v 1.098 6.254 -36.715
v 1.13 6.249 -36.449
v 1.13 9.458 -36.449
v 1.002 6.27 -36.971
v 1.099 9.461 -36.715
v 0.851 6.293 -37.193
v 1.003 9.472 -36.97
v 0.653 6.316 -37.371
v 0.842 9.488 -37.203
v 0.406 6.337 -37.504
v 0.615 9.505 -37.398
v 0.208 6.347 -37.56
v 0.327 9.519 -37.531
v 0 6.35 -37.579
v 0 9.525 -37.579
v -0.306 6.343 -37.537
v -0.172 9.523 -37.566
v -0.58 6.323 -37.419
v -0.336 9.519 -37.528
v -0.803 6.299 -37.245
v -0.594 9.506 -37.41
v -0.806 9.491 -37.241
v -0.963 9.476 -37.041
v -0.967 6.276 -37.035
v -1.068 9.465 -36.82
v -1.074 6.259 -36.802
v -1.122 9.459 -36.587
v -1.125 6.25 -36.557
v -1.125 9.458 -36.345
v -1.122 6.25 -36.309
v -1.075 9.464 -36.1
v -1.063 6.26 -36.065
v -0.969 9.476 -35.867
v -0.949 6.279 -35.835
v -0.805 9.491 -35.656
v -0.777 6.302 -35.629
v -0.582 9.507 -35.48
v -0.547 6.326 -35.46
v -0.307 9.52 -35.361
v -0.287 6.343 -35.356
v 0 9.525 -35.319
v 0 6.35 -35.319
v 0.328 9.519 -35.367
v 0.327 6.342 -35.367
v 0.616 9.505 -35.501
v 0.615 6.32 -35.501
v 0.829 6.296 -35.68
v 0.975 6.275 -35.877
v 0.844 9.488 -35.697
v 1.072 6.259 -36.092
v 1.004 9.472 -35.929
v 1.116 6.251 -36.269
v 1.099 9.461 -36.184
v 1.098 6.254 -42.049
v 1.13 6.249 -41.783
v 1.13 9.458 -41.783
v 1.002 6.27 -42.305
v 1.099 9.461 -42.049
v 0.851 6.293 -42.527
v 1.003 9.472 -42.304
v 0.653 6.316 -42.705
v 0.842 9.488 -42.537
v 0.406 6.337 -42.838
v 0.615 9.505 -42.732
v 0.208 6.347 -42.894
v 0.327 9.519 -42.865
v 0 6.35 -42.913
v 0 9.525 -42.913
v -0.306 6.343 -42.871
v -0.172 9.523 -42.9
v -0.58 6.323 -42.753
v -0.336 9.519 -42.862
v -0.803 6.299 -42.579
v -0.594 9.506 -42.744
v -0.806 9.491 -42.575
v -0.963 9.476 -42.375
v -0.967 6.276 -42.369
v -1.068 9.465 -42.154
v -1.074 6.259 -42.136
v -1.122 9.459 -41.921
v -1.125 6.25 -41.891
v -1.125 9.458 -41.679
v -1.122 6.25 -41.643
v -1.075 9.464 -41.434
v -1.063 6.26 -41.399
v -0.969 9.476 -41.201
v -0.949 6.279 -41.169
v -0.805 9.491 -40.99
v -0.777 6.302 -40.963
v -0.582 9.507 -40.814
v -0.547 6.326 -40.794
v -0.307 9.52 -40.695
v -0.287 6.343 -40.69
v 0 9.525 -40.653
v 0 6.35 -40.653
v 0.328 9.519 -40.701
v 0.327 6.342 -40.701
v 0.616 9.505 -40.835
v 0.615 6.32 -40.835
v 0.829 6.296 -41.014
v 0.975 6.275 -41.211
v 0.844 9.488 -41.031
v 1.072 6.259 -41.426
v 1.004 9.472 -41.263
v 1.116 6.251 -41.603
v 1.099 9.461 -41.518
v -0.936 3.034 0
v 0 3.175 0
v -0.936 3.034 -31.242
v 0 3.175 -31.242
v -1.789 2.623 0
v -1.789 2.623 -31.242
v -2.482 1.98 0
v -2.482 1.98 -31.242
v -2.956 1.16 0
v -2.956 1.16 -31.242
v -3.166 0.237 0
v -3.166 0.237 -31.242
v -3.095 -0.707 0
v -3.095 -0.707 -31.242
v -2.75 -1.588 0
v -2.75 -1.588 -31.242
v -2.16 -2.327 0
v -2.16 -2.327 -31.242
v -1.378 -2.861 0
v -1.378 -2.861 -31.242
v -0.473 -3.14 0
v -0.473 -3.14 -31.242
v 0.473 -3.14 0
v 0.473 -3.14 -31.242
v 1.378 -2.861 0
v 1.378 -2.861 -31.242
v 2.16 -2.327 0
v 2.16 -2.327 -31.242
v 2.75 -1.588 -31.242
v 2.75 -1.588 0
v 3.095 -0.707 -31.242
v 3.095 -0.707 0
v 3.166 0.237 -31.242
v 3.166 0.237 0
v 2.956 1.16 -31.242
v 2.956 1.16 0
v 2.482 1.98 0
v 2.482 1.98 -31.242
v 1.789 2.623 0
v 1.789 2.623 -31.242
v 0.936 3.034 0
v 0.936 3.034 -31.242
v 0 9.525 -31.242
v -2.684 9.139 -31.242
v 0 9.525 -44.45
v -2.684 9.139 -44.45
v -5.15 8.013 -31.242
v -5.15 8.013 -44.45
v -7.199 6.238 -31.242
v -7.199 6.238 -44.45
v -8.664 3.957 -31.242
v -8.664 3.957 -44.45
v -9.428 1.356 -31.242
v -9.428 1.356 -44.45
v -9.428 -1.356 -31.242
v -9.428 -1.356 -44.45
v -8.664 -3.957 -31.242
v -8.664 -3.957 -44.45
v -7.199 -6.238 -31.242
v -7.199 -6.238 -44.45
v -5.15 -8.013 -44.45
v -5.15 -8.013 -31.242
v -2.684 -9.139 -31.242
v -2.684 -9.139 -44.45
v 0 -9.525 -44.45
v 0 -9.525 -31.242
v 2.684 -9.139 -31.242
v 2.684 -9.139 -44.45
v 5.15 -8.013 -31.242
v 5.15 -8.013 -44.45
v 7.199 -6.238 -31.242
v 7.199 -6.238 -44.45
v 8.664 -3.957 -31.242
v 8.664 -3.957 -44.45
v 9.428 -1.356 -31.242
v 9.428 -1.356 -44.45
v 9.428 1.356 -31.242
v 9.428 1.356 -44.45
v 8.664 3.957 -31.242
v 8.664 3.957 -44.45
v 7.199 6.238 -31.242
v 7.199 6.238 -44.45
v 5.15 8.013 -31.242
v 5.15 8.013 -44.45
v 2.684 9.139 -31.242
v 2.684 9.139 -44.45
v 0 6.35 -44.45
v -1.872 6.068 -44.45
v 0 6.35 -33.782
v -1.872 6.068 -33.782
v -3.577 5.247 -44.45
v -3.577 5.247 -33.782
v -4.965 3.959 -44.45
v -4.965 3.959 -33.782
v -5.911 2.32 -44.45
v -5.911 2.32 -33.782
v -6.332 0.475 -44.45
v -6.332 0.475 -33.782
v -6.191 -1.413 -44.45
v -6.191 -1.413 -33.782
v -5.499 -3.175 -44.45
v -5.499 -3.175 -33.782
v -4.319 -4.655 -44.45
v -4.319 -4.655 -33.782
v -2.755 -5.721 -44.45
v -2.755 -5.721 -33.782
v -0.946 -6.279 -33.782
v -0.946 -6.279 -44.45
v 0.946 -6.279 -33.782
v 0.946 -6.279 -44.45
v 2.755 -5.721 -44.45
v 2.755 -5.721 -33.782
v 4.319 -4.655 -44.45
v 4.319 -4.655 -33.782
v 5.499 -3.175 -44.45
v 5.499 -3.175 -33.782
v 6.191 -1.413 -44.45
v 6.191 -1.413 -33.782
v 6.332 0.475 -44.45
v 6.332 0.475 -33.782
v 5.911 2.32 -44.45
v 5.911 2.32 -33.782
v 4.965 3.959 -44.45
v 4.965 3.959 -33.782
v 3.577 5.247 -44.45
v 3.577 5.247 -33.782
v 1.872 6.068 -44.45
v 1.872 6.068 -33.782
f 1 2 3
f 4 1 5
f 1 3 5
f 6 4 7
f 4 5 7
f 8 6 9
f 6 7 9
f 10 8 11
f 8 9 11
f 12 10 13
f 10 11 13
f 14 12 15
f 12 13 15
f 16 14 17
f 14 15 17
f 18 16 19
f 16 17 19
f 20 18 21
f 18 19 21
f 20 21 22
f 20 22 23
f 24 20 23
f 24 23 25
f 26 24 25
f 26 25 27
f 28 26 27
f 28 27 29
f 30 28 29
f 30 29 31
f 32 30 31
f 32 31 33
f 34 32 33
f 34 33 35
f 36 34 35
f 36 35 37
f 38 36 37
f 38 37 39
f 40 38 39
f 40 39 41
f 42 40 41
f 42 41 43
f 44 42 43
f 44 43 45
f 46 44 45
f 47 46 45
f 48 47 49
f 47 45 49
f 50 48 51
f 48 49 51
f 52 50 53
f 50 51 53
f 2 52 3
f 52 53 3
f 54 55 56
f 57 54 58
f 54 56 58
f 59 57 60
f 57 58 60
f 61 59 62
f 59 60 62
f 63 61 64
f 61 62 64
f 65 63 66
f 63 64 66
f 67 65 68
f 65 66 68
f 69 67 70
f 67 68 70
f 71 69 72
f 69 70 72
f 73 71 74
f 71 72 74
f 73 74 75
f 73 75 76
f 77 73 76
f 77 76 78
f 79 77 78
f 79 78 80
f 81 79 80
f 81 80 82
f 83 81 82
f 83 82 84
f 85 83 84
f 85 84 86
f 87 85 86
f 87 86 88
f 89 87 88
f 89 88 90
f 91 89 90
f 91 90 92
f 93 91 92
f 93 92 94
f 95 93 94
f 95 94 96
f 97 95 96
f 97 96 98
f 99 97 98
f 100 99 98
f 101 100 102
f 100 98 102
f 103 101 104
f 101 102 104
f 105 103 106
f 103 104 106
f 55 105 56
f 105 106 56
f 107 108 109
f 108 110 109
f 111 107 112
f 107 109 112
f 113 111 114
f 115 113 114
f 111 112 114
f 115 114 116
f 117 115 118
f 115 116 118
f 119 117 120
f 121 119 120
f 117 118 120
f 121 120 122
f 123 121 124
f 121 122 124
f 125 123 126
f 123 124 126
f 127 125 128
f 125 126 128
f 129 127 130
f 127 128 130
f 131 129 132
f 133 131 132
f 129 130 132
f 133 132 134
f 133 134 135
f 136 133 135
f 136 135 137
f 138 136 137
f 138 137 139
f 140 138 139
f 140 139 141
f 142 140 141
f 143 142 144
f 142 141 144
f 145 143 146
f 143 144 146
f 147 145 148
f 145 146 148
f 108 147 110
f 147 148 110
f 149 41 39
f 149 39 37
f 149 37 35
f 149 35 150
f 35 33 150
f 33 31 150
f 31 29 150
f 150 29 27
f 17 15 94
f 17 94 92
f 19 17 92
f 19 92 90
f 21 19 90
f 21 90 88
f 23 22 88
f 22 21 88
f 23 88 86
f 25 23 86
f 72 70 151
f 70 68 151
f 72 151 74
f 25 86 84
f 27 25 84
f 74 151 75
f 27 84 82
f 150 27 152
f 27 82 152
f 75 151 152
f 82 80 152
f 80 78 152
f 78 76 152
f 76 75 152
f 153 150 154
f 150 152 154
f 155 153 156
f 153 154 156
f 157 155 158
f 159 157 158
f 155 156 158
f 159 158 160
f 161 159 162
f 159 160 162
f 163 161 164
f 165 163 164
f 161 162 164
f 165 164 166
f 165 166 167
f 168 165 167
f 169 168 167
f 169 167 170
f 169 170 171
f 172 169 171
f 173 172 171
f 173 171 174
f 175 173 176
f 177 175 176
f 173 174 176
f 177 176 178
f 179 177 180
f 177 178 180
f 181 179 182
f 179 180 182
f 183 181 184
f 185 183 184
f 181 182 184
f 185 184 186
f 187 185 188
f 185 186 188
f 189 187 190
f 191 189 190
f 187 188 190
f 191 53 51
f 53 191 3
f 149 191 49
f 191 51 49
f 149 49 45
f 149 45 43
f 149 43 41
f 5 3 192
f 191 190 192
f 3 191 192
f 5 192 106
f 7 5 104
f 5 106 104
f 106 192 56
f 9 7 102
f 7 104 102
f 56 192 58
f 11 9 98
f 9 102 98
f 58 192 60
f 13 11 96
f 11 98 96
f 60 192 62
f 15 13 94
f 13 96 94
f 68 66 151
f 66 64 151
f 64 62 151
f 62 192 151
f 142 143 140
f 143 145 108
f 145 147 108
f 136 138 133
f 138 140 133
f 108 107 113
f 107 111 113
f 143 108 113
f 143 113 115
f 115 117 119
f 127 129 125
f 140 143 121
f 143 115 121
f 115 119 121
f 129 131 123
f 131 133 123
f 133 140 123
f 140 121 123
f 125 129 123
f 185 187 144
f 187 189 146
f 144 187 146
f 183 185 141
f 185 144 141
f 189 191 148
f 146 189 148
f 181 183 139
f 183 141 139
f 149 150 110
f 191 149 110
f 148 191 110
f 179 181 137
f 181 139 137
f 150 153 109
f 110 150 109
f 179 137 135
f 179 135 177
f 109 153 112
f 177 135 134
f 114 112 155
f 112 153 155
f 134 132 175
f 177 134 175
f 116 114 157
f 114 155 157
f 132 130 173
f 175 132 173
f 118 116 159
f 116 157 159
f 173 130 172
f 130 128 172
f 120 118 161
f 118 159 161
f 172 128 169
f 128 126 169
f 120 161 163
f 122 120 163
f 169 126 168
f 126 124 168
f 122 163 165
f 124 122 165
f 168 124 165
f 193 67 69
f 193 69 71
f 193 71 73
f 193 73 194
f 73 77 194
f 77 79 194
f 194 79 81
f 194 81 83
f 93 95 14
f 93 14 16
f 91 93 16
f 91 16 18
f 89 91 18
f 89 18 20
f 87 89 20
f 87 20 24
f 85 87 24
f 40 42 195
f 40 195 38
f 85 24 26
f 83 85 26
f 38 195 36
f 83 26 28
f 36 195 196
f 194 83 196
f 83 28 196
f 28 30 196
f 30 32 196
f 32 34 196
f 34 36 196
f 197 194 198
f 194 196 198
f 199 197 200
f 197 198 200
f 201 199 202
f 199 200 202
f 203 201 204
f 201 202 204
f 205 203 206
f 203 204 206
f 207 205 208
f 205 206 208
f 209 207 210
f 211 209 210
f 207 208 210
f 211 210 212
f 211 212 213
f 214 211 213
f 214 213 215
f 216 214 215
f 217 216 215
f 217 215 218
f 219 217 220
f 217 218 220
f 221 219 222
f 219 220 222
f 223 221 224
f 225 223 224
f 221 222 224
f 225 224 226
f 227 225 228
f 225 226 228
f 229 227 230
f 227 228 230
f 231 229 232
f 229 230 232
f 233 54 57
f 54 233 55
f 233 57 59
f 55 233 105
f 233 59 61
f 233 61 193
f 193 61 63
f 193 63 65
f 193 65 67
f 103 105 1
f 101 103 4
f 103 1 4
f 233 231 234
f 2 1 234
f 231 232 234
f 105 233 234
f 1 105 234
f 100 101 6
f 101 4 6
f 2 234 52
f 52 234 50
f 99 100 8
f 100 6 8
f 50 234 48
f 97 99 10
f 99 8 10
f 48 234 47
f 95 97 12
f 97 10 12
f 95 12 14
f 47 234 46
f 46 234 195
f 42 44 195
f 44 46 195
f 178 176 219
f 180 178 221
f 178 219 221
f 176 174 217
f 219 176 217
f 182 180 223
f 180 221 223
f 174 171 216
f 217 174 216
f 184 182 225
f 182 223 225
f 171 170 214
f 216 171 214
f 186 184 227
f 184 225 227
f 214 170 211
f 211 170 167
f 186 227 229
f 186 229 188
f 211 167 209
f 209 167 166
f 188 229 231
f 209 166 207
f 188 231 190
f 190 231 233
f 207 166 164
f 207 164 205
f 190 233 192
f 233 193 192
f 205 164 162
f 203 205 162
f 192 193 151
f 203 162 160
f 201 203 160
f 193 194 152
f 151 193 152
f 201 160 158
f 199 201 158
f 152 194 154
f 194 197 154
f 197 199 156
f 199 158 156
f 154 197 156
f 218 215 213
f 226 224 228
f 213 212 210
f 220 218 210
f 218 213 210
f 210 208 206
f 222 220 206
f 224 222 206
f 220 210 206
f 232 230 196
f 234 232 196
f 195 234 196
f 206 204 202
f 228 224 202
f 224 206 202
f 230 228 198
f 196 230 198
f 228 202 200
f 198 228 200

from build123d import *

# Parameters (mm, degrees)
F_4_40_TAPPED_HOLE1_REACH  = 51.289
F_4_40_TAPPED_HOLE1_BORE_R = 1.1303


with BuildPart() as part:
    # Sketch → Shaft (revolve)
    with BuildSketch(Plane(origin=(0, 0, 0), x_dir=(0, 0, -1), z_dir=(1, 0, 0))):
        Polygon((0, 0), (0, 3.175), (31.242, 3.175), (31.242, 9.525), (44.45, 9.525), (44.45, 6.35), (33.782, 6.35), (33.782, 0), align=None)
    revolve(axis=Axis((0, 0, -33.782), (0, 0, 1)))

    # #4-40 Tapped Hole1 bore → #4-40 Tapped Hole1 (cut, up to next)
    with BuildSketch(Plane(origin=(0, 9.525, 0), x_dir=(1, 0, 0), z_dir=(0, 1, 0)), mode=Mode.PRIVATE) as f_4_40_tapped_hole1_sk1:
        with Locations((0, 36.449)):
            Circle(F_4_40_TAPPED_HOLE1_BORE_R)
    f_4_40_tapped_hole1_tool1 = extrude(f_4_40_tapped_hole1_sk1.sketch, amount=-F_4_40_TAPPED_HOLE1_REACH, mode=Mode.PRIVATE) & part.part
    # #4-40 Tapped Hole1 bore → #4-40 Tapped Hole1 (cut, up to next)
    with BuildSketch(Plane(origin=(0, 9.525, 0), x_dir=(1, 0, 0), z_dir=(0, 1, 0)), mode=Mode.PRIVATE) as f_4_40_tapped_hole1_sk2:
        with Locations((0, 41.783)):
            Circle(F_4_40_TAPPED_HOLE1_BORE_R)
    f_4_40_tapped_hole1_tool2 = extrude(f_4_40_tapped_hole1_sk2.sketch, amount=-F_4_40_TAPPED_HOLE1_REACH, mode=Mode.PRIVATE) & part.part
    add(f_4_40_tapped_hole1_tool1.solids().sort_by_distance((0, 9.525, -36.449))[0], mode=Mode.SUBTRACT)
    add(f_4_40_tapped_hole1_tool2.solids().sort_by_distance((0, 9.525, -41.783))[0], mode=Mode.SUBTRACT)


solid = part.part
